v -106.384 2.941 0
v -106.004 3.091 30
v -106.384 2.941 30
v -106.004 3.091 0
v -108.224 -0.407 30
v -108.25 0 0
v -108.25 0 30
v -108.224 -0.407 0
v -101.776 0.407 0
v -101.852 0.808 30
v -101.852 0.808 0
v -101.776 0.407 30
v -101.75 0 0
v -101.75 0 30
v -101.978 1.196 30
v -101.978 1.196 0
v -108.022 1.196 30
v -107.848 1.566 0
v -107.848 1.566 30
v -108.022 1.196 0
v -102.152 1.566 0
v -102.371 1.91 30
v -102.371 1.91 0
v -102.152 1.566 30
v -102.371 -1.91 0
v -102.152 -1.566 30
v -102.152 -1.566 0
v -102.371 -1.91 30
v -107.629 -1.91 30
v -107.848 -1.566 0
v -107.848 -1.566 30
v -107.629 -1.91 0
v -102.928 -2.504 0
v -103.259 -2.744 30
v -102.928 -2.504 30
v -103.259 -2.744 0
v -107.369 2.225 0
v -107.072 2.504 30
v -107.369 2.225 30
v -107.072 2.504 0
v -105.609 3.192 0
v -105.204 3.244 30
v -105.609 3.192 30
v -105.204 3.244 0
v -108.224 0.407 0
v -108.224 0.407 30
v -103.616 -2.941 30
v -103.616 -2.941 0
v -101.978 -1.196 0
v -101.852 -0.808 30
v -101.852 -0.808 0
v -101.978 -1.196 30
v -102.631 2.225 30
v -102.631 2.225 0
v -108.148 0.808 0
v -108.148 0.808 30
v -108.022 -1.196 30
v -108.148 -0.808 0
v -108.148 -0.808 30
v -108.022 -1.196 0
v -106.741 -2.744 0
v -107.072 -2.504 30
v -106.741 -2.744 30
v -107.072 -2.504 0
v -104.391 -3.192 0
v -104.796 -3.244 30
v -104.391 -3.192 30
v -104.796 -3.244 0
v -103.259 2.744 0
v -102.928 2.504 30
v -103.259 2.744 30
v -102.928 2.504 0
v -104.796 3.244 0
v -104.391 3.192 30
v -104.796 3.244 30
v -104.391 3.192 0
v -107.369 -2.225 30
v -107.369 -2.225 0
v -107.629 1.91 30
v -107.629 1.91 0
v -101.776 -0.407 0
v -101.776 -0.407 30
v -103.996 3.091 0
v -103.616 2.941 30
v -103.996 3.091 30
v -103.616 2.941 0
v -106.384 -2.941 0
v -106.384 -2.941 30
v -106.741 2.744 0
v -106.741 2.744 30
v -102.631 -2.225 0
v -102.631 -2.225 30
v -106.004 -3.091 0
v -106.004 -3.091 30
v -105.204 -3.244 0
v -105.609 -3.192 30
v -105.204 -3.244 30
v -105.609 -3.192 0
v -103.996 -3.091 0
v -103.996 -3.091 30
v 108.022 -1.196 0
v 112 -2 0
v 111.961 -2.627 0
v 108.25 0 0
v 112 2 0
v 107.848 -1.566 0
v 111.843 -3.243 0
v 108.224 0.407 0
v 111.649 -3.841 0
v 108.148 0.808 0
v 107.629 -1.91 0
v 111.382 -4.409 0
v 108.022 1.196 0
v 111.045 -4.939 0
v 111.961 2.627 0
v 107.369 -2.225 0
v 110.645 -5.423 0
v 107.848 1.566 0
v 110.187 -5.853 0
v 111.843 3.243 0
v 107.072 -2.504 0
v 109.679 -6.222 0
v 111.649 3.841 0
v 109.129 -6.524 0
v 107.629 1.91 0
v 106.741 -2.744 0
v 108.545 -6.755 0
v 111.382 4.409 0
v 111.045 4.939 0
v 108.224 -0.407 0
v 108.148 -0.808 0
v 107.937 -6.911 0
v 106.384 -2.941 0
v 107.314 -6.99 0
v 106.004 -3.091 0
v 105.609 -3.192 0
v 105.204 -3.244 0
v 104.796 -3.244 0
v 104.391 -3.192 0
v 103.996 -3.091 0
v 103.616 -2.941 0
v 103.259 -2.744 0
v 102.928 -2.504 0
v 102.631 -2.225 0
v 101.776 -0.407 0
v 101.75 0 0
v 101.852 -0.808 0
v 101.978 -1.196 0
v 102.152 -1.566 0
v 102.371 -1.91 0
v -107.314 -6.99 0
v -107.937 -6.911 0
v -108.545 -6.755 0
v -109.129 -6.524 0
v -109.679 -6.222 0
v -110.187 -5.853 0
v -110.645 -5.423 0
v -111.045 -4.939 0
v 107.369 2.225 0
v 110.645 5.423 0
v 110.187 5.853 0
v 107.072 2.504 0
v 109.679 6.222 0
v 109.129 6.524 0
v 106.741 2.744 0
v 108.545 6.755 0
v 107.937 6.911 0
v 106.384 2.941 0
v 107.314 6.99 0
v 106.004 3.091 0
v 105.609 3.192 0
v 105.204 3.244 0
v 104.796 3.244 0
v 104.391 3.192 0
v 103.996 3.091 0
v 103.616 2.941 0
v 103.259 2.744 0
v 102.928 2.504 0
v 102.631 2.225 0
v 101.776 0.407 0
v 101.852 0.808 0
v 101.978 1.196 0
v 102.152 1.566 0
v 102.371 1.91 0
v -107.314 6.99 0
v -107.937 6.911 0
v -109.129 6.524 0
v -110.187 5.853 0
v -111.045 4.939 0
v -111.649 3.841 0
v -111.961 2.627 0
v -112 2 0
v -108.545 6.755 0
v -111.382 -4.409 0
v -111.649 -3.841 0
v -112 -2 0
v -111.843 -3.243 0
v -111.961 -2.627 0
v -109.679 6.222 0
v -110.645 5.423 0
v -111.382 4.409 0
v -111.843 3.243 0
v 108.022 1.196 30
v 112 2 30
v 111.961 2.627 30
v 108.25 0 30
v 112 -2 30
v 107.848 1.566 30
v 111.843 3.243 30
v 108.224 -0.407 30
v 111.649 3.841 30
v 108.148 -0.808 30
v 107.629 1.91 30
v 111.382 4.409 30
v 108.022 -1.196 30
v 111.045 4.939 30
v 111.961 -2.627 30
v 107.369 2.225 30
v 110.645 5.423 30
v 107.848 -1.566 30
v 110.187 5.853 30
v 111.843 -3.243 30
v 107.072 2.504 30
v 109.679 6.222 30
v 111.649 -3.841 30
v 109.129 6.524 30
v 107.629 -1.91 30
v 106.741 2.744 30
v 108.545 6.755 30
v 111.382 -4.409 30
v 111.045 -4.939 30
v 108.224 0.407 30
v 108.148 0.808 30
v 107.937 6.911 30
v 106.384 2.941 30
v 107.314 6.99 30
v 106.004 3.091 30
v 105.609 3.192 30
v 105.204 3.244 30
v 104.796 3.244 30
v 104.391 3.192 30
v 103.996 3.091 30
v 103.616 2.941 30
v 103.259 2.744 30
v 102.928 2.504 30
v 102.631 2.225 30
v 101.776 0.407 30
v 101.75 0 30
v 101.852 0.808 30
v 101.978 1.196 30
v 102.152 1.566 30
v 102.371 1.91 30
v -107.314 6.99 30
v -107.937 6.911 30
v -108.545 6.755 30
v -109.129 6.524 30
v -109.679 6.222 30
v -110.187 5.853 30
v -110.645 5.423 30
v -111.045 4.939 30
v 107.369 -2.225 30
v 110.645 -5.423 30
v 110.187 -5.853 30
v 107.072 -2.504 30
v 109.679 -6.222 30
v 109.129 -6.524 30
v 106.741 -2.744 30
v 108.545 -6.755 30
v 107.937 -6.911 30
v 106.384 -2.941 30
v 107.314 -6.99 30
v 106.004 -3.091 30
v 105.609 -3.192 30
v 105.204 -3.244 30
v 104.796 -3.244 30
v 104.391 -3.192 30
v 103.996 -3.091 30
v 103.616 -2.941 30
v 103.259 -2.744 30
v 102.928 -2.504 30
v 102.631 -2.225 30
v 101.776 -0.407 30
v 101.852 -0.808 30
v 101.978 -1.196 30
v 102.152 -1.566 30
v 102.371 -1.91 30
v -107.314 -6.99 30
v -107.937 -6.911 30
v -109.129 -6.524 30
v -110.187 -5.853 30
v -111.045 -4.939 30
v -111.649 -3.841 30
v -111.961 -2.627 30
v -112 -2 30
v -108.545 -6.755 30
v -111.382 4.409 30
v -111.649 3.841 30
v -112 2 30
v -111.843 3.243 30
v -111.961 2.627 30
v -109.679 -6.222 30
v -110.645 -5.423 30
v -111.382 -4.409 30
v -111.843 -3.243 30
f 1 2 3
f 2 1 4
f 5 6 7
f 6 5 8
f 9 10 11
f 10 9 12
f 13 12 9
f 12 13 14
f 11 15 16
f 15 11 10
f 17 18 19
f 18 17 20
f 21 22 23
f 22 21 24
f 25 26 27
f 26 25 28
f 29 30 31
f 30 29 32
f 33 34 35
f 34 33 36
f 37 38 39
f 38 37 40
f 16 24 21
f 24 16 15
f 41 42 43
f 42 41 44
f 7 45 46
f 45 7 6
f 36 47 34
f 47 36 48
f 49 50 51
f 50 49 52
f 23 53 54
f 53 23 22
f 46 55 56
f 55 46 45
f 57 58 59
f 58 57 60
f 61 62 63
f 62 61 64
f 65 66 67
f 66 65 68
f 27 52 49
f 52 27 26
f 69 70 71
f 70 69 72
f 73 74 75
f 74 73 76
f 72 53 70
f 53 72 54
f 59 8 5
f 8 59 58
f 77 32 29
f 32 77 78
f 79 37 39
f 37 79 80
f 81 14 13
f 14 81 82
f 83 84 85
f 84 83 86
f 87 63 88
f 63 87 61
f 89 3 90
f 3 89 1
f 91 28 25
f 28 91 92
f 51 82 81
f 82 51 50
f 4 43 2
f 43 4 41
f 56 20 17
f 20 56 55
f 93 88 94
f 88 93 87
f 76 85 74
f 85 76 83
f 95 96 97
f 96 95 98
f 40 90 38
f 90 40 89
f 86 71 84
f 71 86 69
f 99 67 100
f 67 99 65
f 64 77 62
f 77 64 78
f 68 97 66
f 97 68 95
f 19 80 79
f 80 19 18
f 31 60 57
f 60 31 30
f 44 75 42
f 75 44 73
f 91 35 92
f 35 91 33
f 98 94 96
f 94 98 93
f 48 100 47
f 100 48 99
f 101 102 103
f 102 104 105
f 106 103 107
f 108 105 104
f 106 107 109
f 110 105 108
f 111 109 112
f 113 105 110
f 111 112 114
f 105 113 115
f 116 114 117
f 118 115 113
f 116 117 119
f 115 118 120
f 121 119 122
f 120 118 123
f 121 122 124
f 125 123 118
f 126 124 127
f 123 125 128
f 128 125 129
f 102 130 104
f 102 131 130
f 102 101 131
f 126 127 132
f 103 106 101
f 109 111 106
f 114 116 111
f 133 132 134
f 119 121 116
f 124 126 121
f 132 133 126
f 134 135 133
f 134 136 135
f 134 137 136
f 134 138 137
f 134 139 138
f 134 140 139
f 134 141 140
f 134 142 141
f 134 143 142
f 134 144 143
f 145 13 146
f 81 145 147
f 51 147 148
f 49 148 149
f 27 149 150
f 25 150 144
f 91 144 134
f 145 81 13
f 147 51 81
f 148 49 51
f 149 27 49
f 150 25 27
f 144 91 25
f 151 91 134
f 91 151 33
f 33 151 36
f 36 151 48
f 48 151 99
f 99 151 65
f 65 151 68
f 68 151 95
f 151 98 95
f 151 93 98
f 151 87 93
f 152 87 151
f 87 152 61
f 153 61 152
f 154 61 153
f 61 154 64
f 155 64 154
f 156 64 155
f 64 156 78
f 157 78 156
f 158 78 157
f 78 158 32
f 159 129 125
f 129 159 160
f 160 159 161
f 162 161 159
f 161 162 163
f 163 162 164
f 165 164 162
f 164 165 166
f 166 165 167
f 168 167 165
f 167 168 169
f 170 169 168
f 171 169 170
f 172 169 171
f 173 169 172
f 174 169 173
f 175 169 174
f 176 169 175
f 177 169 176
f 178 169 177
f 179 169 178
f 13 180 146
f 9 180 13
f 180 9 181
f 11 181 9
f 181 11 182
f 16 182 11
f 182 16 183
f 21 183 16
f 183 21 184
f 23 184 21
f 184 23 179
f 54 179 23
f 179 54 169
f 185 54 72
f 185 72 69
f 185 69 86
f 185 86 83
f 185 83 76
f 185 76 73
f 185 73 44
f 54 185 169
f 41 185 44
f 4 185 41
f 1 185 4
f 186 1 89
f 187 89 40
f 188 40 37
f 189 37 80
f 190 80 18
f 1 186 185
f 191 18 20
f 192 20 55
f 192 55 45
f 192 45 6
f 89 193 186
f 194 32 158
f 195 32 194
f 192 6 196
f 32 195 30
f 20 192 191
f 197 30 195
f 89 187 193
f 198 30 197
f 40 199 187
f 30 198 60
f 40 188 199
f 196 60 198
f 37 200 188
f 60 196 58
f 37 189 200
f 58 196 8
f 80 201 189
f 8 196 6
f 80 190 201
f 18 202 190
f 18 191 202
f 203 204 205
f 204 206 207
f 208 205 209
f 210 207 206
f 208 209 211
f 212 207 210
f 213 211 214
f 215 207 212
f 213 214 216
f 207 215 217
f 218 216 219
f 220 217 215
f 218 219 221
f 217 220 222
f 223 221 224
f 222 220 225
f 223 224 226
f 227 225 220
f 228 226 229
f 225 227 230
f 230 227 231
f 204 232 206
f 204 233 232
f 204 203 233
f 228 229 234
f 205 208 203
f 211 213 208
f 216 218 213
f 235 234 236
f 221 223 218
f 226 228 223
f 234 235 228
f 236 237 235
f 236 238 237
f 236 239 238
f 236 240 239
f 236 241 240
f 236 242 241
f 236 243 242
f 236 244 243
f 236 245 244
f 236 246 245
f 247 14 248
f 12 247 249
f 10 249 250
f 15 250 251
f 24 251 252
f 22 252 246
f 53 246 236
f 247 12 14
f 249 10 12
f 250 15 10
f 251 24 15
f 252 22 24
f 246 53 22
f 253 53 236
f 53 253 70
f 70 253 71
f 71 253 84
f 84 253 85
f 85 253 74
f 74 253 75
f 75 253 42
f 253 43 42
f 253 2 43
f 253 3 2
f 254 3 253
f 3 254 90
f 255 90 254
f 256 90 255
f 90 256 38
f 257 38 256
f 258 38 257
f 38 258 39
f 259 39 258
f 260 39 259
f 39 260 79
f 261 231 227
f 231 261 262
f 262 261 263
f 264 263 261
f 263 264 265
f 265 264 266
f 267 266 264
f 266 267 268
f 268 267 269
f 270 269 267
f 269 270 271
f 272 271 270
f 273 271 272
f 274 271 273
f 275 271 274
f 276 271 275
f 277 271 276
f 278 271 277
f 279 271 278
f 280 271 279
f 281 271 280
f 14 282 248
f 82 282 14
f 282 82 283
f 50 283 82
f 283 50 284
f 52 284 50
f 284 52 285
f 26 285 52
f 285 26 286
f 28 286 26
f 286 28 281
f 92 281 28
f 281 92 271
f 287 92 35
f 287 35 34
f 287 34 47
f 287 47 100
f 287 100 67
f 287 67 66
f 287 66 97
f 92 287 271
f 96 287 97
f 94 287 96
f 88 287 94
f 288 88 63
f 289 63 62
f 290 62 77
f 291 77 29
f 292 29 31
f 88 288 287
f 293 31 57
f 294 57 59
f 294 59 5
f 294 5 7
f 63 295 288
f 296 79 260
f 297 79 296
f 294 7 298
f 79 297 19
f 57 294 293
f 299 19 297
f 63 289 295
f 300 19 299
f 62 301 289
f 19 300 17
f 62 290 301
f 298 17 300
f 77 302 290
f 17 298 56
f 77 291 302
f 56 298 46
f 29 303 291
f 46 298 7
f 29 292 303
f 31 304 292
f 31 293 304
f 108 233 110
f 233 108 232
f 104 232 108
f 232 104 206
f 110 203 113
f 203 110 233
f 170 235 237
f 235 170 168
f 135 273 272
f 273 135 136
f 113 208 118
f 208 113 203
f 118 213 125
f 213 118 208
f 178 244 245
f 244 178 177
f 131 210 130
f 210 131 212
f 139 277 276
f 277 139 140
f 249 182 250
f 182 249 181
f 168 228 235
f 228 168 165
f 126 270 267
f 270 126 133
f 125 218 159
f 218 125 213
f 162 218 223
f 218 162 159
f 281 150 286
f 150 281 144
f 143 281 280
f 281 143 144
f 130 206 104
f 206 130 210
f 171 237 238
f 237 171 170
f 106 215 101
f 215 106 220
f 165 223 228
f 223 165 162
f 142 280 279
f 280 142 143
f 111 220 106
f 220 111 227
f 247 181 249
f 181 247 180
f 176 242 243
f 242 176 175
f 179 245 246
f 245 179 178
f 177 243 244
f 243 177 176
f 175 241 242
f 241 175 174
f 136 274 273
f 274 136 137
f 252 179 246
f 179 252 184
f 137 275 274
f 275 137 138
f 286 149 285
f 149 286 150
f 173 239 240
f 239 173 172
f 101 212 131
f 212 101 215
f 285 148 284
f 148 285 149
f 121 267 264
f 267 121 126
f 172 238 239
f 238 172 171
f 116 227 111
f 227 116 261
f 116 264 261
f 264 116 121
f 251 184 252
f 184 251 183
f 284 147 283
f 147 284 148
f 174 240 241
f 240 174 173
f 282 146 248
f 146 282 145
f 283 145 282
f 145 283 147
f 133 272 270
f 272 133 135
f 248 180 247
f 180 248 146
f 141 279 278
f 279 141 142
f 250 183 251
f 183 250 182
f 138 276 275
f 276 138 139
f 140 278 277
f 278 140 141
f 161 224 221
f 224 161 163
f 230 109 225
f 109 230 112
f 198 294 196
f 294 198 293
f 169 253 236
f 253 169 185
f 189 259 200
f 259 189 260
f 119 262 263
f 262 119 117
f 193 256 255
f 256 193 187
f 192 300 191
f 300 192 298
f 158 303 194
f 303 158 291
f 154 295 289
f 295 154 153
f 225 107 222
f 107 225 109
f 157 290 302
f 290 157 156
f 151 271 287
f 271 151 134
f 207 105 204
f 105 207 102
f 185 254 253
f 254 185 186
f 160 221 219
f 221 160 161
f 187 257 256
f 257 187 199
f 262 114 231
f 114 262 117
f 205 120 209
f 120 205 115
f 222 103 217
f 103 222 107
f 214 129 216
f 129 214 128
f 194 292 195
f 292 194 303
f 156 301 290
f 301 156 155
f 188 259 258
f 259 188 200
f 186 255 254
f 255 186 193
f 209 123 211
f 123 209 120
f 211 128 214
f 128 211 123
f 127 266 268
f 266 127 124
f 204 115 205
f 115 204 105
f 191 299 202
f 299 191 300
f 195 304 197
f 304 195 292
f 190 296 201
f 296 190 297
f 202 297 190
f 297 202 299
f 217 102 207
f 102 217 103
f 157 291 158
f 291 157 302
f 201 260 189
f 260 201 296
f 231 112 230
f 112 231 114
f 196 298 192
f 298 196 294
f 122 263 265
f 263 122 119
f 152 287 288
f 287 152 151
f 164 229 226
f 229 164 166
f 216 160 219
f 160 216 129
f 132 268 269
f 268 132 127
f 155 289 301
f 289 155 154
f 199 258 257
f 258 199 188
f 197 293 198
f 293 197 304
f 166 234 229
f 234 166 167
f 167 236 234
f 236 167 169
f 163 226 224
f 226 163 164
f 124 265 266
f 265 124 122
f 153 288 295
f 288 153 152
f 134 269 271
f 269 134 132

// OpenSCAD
$fn = 50;


difference() {
	union() {
		hull() {
			translate(v = [-107.0000000000, 2.0000000000, 0]) {
				cylinder(h = 30, r = 5);
			}
			translate(v = [107.0000000000, 2.0000000000, 0]) {
				cylinder(h = 30, r = 5);
			}
			translate(v = [-107.0000000000, -2.0000000000, 0]) {
				cylinder(h = 30, r = 5);
			}
			translate(v = [107.0000000000, -2.0000000000, 0]) {
				cylinder(h = 30, r = 5);
			}
		}
	}
	union() {
		translate(v = [-105.0000000000, 0.0000000000, 0]) {
			cylinder(h = 30, r = 3.2500000000);
		}
		translate(v = [105.0000000000, 0.0000000000, 0]) {
			cylinder(h = 30, r = 3.2500000000);
		}
		translate(v = [-105.0000000000, 0.0000000000, 0]) {
			cylinder(h = 30, r = 1.8000000000);
		}
		translate(v = [105.0000000000, 0.0000000000, 0]) {
			cylinder(h = 30, r = 1.8000000000);
		}
		translate(v = [-105.0000000000, 0.0000000000, 0]) {
			cylinder(h = 30, r = 1.8000000000);
		}
		translate(v = [105.0000000000, 0.0000000000, 0]) {
			cylinder(h = 30, r = 1.8000000000);
		}
		translate(v = [-105.0000000000, 0.0000000000, 0]) {
			cylinder(h = 30, r = 1.8000000000);
		}
		translate(v = [105.0000000000, 0.0000000000, 0]) {
			cylinder(h = 30, r = 1.8000000000);
		}
	}
}
